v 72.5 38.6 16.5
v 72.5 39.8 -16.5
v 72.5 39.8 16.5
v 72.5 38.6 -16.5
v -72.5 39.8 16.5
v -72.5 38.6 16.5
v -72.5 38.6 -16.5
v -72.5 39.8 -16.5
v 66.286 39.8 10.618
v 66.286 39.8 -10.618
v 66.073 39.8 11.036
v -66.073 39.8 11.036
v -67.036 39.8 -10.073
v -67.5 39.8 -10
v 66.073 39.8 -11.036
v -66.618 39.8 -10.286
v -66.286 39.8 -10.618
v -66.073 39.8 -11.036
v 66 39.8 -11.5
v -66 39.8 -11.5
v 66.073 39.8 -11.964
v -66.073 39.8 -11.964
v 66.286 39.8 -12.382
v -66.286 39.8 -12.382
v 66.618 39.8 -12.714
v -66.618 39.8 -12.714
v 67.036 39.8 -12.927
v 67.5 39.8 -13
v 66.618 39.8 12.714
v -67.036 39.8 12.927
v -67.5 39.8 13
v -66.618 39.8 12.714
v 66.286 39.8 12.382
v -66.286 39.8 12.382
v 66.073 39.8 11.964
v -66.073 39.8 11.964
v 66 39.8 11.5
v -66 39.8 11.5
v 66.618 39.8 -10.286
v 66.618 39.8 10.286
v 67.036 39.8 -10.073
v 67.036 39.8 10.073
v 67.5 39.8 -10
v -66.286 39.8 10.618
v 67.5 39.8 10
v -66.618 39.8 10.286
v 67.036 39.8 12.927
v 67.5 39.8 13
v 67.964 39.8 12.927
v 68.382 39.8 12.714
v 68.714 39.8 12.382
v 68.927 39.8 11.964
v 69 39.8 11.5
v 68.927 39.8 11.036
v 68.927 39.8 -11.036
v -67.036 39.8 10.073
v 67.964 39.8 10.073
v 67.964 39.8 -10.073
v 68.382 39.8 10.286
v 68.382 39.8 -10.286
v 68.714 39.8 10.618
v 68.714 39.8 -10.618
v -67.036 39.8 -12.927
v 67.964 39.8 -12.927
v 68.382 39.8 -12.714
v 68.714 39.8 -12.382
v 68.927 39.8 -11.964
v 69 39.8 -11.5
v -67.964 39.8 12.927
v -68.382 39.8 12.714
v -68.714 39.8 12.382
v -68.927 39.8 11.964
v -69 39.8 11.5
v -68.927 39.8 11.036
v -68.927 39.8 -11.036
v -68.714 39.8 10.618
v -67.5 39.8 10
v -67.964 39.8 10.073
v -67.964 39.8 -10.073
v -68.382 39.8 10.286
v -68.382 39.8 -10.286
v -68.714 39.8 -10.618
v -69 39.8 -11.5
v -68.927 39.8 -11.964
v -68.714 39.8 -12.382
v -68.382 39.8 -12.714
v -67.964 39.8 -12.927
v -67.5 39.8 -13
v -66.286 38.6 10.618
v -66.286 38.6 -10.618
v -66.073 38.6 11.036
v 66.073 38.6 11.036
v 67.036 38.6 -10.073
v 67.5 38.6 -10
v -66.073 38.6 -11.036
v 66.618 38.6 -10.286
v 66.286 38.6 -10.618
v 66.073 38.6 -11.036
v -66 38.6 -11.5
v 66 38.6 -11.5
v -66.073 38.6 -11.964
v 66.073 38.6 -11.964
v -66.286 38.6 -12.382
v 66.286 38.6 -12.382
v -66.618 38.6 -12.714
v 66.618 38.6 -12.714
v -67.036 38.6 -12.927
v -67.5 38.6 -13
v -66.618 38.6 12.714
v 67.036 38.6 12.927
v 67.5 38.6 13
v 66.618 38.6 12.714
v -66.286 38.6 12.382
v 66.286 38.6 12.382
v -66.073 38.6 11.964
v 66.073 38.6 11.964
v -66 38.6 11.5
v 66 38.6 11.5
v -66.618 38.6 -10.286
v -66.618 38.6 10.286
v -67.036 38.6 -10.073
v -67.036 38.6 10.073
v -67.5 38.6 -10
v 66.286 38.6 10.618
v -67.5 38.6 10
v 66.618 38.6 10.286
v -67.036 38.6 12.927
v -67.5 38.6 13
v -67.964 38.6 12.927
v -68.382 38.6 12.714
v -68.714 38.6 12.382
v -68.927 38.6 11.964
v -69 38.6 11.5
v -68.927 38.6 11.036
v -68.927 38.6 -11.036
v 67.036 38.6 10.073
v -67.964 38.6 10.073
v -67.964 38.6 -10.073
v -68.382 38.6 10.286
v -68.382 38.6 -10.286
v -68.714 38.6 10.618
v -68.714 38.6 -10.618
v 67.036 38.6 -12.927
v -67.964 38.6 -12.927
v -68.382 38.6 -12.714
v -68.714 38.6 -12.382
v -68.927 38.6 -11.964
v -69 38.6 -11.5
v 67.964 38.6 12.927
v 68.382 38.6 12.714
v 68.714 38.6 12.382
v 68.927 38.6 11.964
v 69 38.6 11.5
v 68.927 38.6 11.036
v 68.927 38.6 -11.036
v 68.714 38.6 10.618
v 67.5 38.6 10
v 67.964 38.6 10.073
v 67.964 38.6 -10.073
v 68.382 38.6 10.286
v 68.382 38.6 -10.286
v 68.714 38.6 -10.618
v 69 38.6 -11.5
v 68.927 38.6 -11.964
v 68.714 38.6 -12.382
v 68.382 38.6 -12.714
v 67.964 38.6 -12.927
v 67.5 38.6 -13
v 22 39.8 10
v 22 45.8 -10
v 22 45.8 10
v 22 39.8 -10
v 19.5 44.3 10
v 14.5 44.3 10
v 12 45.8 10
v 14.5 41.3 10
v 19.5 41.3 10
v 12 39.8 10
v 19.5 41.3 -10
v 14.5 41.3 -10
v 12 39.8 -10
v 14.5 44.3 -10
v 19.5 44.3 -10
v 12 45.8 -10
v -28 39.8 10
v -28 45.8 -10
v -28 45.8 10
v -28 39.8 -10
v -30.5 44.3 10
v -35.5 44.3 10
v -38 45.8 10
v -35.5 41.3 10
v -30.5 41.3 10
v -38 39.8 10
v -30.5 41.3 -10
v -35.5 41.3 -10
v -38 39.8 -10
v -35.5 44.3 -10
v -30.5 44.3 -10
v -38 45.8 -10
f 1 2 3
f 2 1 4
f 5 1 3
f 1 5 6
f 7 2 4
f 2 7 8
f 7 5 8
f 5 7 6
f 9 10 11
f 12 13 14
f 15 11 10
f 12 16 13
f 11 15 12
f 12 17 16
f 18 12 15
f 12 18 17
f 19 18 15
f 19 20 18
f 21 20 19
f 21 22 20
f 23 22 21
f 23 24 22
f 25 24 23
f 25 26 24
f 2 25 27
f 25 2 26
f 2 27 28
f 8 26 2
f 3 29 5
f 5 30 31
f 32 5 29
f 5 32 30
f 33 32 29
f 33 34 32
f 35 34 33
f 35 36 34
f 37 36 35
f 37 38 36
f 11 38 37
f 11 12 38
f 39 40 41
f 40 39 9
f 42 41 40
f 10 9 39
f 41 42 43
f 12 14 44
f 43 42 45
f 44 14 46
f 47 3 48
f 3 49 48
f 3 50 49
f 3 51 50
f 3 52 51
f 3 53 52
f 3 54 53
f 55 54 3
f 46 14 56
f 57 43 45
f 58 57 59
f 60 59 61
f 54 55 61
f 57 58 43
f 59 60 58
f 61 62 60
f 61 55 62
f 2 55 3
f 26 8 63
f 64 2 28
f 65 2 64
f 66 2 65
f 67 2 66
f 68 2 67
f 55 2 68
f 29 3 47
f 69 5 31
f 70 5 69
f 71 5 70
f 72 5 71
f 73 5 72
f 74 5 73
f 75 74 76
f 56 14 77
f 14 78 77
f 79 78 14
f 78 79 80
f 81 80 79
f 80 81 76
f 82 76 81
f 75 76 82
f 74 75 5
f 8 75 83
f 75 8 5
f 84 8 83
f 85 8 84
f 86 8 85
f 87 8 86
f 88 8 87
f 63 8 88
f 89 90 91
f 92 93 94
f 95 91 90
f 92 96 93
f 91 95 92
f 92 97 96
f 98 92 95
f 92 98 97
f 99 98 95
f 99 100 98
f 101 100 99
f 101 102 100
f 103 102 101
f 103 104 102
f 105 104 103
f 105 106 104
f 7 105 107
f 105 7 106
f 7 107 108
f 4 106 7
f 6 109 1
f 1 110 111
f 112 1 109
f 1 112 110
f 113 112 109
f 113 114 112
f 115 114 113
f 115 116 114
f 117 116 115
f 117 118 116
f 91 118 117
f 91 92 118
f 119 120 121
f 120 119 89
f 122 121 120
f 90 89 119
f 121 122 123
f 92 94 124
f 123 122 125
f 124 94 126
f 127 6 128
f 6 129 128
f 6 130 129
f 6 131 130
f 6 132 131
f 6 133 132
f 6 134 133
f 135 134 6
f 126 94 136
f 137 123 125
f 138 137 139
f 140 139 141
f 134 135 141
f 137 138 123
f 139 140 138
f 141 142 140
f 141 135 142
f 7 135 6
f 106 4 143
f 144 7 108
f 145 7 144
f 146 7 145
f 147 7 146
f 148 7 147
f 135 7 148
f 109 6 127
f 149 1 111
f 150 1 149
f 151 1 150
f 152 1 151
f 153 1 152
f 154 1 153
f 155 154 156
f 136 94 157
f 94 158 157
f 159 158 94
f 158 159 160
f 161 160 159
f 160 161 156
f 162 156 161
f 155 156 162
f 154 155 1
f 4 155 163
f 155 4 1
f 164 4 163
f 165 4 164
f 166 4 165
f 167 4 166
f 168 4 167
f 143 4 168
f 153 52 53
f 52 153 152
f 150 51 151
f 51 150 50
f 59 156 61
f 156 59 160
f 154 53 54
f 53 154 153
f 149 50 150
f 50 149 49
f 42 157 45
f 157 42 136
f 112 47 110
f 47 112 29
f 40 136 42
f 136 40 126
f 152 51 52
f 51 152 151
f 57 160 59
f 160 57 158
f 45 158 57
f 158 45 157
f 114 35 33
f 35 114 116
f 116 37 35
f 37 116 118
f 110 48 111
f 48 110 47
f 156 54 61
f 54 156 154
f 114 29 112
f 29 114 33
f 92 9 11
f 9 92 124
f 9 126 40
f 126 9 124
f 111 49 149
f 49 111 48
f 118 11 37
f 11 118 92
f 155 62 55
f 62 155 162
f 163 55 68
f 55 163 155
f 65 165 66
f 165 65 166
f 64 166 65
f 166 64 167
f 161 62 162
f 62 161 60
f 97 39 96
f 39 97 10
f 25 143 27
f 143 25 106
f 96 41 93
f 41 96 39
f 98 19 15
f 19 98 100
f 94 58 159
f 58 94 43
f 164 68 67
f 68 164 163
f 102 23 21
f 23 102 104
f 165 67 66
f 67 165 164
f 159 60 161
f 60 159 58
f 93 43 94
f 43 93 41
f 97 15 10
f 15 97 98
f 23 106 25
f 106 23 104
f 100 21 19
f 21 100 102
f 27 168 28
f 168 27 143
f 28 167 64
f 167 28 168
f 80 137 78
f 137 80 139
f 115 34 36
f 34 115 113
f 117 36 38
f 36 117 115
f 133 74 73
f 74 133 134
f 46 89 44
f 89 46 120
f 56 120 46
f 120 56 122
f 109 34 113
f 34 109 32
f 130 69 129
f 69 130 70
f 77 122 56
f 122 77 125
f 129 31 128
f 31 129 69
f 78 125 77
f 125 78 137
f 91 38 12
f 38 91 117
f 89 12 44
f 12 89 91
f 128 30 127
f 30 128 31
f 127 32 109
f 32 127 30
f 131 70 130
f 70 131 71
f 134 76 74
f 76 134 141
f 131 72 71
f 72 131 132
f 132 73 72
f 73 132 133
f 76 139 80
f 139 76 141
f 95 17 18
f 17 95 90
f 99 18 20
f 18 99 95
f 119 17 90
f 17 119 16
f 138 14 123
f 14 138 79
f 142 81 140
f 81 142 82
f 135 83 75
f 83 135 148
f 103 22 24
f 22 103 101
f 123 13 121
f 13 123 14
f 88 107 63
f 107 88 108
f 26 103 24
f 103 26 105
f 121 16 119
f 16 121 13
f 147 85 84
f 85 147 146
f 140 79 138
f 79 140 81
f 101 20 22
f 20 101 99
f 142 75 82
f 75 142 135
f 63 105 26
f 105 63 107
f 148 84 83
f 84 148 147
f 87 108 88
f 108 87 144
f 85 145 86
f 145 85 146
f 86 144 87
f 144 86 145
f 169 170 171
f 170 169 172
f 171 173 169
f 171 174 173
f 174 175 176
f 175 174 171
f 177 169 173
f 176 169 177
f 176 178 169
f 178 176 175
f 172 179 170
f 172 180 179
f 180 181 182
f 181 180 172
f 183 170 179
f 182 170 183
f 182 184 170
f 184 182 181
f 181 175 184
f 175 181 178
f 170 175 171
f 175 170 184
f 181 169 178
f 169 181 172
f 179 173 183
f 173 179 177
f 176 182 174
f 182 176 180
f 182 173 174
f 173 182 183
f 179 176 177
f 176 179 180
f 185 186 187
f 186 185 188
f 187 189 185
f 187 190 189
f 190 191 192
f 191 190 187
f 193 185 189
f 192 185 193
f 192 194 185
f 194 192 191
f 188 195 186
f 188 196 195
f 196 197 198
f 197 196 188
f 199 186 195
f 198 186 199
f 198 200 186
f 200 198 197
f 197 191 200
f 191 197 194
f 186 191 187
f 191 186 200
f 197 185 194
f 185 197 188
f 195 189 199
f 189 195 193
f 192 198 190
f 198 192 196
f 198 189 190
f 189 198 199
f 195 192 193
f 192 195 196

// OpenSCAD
thick = 1.2;
width = 145;

module mainCircuit(pos = [0, 0, 0])
{
    translate(pos)
    cube([width/2, 22, 20], center = true);
}

module ledMatrix(pos = [0, 0, 0], size = [width, 16, 33])
{
    translate(pos)
    cube(size, center = true);
}

module screwHole(pos)
{
    size = 10;
    translate(pos)
    difference()
    {
        cube([size, size, size], center = true);
        
        translate([0, 1.1, 0])
        screw();
    }
}

module screw(pos = [0,0,0], d = 3)
{
    translate(pos)
    rotate([90, 0, 0])
    cylinder(h = 8, d = d, $fn=20, center = true);
}

module hang(pos = [0, 0, 0])
{
    translate(pos)
    difference()
    {
        cube([10, 6, 20], center = true);
        cube([5, 3, 22], center = true);
    }
}

module backBox()
{   
    difference()
    {
        union()
        {
            difference()
            {
                translate([0, 0.5*(22 + 16) + thick, 0])
                cube([width + 2*thick, 22 + 16 + thick, 33 + 2*thick], center = true);
                ledMatrix([0, 8, 0], [width, 100, 33]);
            }
            
            screwHole([width/2 - 5, 22 + 16 - 5, 33/2 - 5]);
            screwHole([width/2 - 5, 22 + 16 - 5, -33/2 + 5]);
            screwHole([-width/2 + 5, 22 + 16 - 5, 33/2 - 5]);
            screwHole([-width/2 + 5, 22 + 16 - 5, -33/2 + 5]);
            
            temp = width - 129;
            translate([width / 2 - temp / 2, 2 + thick/2, 0])
            cube([temp, 4, 22 + 16 - 5], center = true);
        }
 
        rotate([90, 0, 0])
        screw([50, 15, -25], 4);
        rotate([90, 0, 0])
        screw([40, 15, -25], 6);
    }
}

module backBox2(pos = [0, 0, 0])
{
    translate(pos)
    union()
    {
        difference()
        {
            translate()
            cube([width, thick, 33], center = true);
            
            screw([width/2 - 5, 0, 33/2 - 5]);
            screw([width/2 - 5, 0, -33/2 + 5]);
            screw([-width/2 + 5, 0, 33/2 - 5]);
            screw([-width/2 + 5, 0, -33/2 + 5]);
        }
        hang([25 - 8, 3 + thick/2, 0]);
        hang([-25 - 8, 3 + thick/2, 0]);
    }
}

//backBox();
backBox2([0, 22 + 16 + thick]);
//#ledMatrix([0, 8, 0]);
//#mainCircuit([0, 22 + 16 - 11, 0]);
